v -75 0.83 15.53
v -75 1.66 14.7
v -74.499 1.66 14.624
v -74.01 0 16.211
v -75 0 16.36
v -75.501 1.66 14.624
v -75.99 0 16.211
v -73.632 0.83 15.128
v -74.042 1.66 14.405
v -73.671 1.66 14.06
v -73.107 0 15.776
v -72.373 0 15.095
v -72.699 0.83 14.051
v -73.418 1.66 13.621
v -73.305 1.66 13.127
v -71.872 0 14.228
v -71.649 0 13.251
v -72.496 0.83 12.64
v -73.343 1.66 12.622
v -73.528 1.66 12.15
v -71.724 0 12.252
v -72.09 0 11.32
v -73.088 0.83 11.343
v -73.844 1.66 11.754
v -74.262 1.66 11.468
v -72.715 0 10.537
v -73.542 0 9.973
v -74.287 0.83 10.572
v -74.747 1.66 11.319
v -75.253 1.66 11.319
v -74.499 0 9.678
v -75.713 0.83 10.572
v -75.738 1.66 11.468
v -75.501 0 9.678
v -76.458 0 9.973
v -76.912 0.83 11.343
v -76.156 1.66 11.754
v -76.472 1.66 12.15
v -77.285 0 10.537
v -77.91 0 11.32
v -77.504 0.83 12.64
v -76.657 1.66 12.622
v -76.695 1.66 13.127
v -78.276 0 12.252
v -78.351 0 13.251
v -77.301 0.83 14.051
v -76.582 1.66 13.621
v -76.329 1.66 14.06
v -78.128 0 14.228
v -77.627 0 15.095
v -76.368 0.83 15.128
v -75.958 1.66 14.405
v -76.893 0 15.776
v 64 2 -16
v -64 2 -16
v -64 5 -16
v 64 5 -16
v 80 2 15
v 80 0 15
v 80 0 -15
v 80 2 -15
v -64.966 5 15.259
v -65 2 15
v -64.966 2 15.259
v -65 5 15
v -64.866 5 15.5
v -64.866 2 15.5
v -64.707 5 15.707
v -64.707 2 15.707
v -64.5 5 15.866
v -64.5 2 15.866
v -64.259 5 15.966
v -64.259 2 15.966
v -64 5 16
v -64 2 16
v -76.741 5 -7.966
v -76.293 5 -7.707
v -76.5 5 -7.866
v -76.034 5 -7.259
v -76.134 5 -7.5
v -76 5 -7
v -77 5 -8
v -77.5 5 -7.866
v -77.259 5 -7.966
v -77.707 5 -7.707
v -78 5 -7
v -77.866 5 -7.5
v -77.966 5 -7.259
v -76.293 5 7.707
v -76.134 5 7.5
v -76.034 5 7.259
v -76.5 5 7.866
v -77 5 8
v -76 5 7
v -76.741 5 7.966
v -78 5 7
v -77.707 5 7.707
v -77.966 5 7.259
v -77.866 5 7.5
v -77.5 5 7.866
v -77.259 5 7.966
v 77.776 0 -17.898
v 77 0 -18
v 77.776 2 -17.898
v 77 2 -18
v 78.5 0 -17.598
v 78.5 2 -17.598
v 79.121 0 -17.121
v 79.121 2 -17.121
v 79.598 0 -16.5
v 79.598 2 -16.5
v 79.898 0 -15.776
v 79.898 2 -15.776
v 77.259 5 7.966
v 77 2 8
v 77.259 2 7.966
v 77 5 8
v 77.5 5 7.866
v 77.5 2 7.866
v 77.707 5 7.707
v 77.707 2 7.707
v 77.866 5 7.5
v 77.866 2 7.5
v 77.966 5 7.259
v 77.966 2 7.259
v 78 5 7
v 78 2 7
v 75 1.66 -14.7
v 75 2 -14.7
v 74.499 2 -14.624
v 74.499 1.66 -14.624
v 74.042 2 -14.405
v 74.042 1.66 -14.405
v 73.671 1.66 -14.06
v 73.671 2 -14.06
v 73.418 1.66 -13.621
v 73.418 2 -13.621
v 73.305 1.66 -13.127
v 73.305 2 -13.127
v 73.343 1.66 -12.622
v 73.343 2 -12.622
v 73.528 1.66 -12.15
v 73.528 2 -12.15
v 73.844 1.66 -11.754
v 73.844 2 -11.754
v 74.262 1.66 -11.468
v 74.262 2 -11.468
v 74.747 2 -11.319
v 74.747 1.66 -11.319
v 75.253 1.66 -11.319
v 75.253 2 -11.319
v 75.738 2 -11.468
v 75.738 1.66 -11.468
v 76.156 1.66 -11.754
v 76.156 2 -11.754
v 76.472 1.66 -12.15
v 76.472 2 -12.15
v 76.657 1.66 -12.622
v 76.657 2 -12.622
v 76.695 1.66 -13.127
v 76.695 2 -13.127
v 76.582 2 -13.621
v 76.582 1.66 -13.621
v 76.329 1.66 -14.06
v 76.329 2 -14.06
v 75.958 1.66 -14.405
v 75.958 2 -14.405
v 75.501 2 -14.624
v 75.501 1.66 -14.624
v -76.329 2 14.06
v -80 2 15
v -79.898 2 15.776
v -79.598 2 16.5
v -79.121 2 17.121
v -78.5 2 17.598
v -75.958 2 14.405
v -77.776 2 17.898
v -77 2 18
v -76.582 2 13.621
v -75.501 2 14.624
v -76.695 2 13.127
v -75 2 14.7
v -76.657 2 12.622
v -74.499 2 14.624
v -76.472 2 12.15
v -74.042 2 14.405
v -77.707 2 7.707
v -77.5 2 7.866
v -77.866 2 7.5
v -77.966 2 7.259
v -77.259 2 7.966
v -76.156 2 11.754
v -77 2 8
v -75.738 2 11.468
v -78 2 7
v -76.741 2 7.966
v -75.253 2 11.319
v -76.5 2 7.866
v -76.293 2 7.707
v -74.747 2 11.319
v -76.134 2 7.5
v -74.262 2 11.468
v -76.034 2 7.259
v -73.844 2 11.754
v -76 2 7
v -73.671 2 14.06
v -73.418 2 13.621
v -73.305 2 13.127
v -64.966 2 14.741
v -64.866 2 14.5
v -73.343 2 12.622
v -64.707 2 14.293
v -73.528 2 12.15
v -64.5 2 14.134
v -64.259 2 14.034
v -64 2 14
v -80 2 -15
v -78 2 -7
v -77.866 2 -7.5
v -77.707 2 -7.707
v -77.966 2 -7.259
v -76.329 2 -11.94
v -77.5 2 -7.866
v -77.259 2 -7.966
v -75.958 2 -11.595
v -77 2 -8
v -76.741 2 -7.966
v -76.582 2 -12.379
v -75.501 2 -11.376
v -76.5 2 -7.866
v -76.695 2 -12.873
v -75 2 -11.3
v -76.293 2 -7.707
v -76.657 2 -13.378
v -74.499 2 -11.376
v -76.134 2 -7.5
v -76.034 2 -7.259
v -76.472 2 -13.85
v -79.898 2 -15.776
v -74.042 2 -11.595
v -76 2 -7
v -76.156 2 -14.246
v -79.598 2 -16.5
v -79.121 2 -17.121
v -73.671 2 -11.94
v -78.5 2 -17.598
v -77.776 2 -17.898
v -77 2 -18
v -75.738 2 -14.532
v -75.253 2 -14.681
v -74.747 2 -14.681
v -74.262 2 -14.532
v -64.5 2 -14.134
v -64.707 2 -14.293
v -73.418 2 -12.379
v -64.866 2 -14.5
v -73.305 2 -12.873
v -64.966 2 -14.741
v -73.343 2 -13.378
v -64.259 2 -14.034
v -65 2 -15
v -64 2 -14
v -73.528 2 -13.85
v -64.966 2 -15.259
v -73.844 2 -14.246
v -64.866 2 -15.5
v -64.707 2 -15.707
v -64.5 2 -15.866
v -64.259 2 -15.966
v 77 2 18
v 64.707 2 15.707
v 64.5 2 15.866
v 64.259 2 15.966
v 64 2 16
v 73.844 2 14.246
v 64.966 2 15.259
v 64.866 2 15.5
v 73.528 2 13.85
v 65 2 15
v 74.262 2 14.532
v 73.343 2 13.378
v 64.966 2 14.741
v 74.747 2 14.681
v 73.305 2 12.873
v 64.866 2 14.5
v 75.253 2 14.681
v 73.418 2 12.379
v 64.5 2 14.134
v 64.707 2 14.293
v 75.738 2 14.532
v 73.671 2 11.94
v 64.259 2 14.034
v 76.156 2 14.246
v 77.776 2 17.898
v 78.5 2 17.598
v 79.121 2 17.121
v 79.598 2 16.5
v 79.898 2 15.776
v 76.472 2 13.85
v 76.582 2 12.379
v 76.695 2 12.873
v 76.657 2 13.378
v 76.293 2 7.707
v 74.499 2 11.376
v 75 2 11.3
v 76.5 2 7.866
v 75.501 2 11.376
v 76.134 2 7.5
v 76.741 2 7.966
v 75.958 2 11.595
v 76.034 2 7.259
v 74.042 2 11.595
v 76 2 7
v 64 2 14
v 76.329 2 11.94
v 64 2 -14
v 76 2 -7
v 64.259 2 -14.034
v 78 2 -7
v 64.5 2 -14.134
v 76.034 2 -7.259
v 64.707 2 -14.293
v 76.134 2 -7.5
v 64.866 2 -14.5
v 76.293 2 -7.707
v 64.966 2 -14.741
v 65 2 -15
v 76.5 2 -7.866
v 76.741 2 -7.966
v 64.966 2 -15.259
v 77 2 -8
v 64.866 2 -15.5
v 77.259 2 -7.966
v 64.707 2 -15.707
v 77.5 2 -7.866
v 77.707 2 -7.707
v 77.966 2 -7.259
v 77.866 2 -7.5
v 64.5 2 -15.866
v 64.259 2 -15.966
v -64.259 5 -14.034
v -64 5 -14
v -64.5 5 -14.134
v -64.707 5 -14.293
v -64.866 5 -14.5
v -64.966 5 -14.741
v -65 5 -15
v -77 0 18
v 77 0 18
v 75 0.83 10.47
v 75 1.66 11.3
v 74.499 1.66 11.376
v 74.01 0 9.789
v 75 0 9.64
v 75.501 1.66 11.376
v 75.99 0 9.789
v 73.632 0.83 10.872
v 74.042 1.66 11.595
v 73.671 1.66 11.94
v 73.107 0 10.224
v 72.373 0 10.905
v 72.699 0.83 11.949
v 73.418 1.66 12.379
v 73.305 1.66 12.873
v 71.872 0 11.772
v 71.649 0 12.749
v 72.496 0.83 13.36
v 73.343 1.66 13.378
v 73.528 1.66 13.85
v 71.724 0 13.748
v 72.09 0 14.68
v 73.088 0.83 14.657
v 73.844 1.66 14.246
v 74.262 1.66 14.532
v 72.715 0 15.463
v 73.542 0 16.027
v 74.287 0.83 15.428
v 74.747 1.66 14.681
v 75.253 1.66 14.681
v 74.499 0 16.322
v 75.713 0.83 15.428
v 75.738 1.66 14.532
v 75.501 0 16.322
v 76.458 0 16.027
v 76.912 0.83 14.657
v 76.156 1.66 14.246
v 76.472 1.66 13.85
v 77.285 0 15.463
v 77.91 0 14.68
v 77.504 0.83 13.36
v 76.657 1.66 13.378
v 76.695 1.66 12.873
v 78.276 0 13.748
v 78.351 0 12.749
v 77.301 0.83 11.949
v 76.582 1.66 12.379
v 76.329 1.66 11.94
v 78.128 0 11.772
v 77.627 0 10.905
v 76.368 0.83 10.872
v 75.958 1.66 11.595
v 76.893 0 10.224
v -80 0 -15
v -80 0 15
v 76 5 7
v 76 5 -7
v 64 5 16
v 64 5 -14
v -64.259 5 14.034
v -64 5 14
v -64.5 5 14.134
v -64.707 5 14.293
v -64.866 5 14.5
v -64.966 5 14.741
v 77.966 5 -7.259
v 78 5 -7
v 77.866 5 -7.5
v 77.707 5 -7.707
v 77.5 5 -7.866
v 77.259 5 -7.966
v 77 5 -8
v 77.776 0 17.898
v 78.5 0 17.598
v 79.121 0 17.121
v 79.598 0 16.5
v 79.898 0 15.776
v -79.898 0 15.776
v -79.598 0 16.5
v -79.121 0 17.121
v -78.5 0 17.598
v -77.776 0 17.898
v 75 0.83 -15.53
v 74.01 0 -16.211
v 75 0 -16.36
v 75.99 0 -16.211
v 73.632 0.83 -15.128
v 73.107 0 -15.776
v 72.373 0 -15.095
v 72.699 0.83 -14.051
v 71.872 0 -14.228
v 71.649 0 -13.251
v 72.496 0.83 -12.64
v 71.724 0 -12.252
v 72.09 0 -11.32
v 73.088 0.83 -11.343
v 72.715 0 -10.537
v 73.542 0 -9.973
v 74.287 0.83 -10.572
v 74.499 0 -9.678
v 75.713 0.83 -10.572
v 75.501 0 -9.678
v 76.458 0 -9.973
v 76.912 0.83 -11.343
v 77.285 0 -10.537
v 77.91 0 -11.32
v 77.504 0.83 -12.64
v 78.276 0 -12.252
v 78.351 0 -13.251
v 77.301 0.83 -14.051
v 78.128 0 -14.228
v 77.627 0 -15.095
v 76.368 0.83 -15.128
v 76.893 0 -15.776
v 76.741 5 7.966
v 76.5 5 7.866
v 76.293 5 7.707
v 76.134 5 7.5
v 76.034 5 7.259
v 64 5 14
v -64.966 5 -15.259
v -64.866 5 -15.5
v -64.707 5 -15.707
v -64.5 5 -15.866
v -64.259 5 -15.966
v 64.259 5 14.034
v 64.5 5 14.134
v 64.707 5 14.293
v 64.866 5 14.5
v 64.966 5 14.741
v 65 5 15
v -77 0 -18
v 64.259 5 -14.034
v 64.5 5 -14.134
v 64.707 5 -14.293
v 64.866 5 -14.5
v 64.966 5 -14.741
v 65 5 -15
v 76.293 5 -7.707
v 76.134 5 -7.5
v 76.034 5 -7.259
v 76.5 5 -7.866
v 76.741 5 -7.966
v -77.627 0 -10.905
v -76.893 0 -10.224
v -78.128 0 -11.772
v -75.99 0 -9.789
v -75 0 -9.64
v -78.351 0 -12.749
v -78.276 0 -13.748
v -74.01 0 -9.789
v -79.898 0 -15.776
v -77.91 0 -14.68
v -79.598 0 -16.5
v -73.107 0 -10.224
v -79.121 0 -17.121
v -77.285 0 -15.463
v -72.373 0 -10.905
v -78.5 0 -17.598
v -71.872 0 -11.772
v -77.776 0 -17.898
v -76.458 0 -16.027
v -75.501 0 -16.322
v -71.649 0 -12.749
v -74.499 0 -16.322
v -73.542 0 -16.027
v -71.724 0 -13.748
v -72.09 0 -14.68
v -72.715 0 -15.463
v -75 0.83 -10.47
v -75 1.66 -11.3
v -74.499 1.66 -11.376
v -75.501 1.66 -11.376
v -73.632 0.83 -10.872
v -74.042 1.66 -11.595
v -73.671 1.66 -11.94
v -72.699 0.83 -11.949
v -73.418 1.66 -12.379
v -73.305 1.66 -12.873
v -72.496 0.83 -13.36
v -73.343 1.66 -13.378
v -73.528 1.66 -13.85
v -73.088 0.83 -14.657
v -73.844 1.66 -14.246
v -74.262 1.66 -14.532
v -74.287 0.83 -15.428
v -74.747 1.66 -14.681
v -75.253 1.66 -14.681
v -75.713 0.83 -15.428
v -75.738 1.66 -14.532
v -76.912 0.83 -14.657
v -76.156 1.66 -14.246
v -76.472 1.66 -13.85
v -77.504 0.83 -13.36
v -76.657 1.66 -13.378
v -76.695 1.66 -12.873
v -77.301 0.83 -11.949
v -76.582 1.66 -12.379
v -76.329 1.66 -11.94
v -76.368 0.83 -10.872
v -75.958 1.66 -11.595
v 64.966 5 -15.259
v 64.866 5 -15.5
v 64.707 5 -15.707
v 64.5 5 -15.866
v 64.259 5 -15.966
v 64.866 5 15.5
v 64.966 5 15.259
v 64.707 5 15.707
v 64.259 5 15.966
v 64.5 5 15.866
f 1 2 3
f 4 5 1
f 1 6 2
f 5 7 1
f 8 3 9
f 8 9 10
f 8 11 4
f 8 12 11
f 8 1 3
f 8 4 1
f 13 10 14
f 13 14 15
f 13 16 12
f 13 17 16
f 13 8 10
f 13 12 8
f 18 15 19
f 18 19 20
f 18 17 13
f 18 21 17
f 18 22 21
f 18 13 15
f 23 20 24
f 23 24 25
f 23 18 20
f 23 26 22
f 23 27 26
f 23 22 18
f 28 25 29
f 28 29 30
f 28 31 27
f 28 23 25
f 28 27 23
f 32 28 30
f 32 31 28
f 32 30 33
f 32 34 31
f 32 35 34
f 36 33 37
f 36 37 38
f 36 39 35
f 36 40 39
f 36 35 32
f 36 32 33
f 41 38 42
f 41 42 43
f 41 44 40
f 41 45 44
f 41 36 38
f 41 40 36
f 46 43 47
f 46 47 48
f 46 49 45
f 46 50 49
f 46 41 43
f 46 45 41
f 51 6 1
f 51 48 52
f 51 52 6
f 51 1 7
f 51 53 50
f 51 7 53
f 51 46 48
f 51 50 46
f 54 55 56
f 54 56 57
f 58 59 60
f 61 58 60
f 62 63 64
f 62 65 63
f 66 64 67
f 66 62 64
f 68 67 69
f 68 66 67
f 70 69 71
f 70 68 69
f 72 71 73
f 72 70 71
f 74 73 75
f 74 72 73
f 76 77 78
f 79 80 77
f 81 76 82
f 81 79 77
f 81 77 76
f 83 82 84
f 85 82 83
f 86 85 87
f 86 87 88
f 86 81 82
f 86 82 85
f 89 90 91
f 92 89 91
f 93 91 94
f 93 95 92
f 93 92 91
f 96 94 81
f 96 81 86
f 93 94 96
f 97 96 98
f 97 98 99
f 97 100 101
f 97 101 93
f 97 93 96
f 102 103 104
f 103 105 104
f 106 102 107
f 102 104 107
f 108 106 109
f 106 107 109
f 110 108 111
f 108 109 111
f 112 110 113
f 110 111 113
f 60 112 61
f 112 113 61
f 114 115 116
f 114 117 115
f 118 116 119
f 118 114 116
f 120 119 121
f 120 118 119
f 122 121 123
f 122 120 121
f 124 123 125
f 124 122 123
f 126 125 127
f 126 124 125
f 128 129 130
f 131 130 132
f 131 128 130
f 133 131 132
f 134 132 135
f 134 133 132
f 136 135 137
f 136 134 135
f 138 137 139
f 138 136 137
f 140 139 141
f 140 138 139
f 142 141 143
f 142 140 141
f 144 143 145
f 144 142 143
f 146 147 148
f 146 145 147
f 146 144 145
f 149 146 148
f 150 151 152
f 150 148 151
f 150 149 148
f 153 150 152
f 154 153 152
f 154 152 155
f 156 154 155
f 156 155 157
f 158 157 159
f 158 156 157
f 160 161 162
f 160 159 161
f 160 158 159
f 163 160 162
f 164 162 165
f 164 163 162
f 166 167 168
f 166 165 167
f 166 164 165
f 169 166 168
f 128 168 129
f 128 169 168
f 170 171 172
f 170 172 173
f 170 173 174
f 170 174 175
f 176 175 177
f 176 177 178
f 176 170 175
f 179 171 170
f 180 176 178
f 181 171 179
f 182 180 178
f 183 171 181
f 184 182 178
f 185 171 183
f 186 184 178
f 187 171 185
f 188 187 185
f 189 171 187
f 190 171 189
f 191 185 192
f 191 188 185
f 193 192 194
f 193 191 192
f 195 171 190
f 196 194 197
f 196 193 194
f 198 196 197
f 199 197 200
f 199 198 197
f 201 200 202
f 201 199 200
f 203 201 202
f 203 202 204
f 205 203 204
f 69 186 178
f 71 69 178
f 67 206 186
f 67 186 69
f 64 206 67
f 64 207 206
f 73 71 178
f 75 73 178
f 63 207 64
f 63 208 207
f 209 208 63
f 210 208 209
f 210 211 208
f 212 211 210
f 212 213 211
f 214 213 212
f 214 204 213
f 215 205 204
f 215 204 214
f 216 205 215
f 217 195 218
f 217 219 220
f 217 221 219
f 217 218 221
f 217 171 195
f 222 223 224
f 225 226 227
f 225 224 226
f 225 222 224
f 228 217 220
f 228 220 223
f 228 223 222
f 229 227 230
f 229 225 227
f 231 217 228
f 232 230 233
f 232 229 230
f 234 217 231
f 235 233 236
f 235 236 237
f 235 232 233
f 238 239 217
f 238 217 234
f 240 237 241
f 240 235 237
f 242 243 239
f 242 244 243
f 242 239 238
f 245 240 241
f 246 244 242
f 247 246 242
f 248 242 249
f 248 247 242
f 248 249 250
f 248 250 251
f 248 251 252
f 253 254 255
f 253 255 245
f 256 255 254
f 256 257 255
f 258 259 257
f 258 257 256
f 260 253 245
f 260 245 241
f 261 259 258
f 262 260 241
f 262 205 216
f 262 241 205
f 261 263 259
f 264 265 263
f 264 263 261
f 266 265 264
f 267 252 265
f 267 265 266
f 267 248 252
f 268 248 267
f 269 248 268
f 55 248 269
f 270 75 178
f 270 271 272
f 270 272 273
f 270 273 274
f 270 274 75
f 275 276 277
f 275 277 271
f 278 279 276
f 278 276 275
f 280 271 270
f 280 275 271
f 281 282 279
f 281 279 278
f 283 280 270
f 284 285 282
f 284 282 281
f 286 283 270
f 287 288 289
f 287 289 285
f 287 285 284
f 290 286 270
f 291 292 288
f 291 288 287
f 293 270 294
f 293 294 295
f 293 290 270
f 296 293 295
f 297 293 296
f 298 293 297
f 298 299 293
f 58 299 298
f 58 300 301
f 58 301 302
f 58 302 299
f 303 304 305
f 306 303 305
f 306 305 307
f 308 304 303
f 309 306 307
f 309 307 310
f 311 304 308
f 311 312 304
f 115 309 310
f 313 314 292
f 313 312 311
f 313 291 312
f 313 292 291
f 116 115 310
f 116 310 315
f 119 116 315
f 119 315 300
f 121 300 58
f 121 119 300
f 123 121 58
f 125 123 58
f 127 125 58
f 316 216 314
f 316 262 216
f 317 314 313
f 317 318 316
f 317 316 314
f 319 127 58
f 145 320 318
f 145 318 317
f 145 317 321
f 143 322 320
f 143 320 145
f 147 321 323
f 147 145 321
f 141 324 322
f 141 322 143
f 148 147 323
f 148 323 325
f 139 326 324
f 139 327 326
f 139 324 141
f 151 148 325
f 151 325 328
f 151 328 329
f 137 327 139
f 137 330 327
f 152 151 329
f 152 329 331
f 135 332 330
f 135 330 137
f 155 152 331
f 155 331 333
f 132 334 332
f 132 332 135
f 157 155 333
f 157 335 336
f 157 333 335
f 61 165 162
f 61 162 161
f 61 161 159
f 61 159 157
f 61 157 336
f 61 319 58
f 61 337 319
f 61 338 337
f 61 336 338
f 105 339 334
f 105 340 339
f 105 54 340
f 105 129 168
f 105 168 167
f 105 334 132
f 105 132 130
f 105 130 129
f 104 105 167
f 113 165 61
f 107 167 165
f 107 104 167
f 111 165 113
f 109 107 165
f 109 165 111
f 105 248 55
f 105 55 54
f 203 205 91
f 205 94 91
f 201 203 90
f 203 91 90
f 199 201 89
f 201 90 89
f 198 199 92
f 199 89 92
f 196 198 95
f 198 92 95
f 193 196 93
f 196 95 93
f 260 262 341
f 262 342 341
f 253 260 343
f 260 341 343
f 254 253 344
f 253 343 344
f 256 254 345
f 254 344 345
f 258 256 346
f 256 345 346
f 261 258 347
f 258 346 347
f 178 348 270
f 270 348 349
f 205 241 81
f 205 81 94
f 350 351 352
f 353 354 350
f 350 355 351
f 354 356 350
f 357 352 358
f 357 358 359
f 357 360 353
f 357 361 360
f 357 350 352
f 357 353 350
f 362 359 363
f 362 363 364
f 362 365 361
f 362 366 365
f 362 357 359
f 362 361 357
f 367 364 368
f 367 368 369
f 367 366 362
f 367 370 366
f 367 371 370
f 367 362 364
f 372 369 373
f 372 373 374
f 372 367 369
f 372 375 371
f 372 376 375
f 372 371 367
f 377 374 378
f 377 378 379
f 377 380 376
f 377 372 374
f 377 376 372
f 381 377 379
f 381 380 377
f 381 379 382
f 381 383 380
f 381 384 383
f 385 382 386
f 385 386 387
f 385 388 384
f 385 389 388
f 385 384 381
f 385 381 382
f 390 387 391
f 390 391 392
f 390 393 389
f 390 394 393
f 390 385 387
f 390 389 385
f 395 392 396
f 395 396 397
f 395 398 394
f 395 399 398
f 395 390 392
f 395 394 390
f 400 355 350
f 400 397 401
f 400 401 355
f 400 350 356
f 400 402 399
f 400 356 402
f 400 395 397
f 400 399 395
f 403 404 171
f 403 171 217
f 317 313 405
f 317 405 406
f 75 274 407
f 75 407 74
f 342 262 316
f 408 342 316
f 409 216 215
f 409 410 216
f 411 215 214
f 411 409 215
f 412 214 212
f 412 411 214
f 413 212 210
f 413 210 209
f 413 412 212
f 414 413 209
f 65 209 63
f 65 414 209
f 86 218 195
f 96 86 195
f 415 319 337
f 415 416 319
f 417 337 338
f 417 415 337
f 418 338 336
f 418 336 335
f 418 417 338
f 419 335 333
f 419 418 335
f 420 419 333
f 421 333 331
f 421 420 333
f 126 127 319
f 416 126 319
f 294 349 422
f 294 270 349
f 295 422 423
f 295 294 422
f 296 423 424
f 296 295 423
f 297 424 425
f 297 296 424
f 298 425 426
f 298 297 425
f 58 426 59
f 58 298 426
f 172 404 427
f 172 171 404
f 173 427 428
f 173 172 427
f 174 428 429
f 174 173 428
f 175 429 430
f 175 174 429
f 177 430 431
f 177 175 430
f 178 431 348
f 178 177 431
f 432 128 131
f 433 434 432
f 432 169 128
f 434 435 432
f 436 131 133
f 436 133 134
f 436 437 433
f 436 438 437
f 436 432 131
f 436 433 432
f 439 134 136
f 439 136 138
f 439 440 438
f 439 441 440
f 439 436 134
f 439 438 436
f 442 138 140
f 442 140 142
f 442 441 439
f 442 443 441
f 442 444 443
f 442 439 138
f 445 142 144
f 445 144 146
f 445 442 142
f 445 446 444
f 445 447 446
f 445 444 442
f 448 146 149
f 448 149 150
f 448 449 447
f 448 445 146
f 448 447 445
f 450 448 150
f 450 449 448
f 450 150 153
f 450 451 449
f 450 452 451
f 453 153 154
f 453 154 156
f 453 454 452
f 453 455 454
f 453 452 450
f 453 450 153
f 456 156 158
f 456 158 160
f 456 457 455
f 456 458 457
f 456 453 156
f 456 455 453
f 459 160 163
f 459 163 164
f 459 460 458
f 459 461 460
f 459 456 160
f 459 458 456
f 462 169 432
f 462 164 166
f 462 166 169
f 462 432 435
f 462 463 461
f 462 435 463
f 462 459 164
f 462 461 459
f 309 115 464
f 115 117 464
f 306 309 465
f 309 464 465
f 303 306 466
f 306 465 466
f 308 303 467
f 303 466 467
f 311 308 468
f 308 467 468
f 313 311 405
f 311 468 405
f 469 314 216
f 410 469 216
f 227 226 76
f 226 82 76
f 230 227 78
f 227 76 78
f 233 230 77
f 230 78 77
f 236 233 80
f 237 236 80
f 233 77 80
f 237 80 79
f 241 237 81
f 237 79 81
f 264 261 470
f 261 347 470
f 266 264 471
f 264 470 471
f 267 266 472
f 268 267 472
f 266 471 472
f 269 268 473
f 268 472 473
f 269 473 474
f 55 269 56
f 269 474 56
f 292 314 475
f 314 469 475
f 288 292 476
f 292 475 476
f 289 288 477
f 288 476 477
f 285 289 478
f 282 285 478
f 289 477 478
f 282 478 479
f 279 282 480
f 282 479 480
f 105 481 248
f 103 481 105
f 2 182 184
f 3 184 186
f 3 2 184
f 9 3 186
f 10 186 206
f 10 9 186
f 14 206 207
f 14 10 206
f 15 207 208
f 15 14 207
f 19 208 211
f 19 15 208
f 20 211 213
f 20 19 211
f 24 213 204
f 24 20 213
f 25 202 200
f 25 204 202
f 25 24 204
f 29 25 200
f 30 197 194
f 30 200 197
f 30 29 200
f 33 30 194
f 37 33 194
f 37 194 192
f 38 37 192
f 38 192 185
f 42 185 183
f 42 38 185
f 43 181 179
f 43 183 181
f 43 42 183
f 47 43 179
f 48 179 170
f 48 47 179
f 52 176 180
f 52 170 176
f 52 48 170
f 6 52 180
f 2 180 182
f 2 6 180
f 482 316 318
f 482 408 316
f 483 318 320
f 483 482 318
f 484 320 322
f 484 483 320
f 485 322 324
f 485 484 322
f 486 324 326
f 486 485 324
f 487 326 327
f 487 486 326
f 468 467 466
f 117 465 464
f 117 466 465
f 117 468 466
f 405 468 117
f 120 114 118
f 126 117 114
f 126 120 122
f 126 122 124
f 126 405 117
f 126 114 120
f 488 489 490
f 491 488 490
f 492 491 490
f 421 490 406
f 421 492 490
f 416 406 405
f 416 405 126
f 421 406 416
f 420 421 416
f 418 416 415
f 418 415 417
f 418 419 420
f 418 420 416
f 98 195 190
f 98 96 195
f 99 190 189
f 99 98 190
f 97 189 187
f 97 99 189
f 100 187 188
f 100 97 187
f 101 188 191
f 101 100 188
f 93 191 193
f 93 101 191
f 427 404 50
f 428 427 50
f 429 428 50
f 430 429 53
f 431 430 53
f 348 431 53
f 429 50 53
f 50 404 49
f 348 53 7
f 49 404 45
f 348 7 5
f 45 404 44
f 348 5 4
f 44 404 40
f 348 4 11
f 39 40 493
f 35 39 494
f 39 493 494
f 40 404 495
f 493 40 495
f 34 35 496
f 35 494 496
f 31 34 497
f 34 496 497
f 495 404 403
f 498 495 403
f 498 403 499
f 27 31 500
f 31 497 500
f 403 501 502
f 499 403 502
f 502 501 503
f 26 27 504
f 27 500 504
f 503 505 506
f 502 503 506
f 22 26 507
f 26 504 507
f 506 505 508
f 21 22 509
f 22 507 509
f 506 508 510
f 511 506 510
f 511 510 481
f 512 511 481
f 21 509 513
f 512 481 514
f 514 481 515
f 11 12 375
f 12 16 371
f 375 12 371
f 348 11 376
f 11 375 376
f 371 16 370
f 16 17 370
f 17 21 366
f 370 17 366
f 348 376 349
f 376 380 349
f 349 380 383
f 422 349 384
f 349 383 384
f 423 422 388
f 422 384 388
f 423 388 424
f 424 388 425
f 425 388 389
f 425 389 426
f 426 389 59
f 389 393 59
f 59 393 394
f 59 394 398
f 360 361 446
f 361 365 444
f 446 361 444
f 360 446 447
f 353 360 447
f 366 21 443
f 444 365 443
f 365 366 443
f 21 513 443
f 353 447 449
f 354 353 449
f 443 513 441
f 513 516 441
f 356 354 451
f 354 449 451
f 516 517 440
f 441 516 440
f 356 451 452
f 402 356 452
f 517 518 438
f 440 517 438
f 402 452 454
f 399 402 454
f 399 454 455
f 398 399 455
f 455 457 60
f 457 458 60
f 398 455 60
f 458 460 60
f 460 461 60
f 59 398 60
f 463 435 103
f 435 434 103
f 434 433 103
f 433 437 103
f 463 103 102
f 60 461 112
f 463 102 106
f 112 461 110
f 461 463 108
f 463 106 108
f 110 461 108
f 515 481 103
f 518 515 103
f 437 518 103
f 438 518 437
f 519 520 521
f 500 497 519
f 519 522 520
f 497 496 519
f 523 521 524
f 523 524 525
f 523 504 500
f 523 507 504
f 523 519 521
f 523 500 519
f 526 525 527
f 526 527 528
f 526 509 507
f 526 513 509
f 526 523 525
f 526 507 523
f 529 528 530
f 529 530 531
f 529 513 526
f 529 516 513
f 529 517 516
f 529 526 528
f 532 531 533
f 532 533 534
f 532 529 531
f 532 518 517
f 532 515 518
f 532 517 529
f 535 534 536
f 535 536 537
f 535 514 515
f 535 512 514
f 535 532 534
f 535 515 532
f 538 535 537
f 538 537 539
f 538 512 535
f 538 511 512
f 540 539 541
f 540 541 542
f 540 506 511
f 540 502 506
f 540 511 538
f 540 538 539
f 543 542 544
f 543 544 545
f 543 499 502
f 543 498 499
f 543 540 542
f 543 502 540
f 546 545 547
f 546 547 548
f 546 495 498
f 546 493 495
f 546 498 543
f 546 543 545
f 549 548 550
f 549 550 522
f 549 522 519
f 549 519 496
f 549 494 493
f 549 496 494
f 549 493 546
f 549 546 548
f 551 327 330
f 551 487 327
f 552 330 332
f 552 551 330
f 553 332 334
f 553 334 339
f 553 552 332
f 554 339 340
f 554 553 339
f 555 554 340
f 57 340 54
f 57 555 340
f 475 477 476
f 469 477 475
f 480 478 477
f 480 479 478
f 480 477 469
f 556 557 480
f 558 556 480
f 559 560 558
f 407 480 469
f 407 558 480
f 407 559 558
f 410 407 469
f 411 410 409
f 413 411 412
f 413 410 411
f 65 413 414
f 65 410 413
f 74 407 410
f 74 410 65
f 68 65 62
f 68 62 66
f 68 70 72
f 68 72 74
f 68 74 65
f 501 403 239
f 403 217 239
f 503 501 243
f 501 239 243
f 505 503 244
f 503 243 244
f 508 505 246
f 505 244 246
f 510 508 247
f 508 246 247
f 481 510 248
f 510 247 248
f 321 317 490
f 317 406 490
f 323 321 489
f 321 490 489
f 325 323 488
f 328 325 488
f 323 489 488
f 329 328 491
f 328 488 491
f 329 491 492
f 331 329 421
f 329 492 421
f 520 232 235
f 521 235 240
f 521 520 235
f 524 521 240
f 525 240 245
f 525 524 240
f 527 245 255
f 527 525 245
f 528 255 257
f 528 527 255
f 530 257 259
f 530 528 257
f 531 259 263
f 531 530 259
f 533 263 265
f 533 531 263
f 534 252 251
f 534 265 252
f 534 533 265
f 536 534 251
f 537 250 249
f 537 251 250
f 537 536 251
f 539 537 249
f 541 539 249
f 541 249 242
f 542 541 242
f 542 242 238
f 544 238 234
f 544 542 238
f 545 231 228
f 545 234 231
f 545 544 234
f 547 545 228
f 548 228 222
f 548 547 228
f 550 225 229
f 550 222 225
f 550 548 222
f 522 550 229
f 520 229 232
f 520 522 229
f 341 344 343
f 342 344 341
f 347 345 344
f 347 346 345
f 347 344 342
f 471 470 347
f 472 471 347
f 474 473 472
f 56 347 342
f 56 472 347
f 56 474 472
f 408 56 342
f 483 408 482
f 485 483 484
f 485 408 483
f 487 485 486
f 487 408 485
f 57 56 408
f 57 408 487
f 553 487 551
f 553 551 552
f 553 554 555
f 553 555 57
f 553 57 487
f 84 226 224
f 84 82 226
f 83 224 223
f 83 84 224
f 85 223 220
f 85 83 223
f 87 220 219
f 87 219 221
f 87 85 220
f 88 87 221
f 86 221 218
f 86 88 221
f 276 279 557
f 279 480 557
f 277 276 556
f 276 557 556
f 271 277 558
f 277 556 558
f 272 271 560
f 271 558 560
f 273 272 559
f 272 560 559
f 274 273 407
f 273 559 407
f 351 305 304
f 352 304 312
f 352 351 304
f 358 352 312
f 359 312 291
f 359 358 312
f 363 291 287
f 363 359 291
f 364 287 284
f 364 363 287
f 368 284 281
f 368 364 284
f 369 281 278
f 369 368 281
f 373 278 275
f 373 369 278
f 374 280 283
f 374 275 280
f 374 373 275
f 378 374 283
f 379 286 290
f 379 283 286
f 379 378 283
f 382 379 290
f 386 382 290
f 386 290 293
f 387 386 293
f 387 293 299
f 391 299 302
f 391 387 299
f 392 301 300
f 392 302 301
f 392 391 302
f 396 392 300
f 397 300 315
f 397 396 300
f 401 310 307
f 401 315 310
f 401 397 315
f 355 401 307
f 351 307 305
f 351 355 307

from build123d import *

# Parameters (mm, degrees)
SKETCH1_W                    = 160
SKETCH1_H                    = 36
BOSS_EXTRUDE1_DEPTH          = 2
SKETCH2_W                    = 130
SKETCH2_H                    = 2
SKETCH2_W_2                  = 2
SKETCH2_H_2                  = 16
BOSS_EXTRUDE2_DEPTH          = 3
CSK_FOR_M3_SFHCS1_AT_2_COUNT = 2
CSK_FOR_M3_SFHCS1_AT_2_PITCH = 26
CIRPATTERN1_COUNT            = 2
FILLET1_R                    = 3
FILLET2_R                    = 1


with BuildPart() as part:
    # Sketch1 → Boss-Extrude1 (new body)
    with BuildSketch(Plane(origin=(0, 0, 0), x_dir=(1, 0, 0), z_dir=(0, 1, 0))):
        Rectangle(SKETCH1_W, SKETCH1_H)
    extrude(amount=BOSS_EXTRUDE1_DEPTH)

    # Sketch2 → Boss-Extrude2 (add)
    with BuildSketch(Plane(origin=(0, 2, 0), x_dir=(1, 0, 0), z_dir=(0, 1, 0))):
        with Locations((0, 15)):
            Rectangle(SKETCH2_W, SKETCH2_H)
        with Locations((77, 0)):
            Rectangle(SKETCH2_W_2, SKETCH2_H_2)
    boss_extrude2 = extrude(amount=BOSS_EXTRUDE2_DEPTH)

    # Sketch7 → CSK for M3 SFHCS1 (revolve, cut)
    with BuildSketch(Plane(origin=(75, 0, -13), x_dir=(0, 0, -1), z_dir=(1, 0, 0))):
        Polygon((0, 0), (0, 11.021463052), (1.7, 10), (1.7, 1.66), (3.36, 0), align=None)
    csk_for_m3_sfhcs1 = revolve(axis=Axis((75, -6.35, -13), (0, 1, 0)), mode=Mode.SUBTRACT)

    # CSK for M3 SFHCS1 at 2: CSK for M3 SFHCS1 ×2
    with Locations(*[(0, 0, i * CSK_FOR_M3_SFHCS1_AT_2_PITCH) for i in range(1, CSK_FOR_M3_SFHCS1_AT_2_COUNT)]):
        add(csk_for_m3_sfhcs1, mode=Mode.SUBTRACT)

    # CirPattern1: Boss-Extrude2, CSK for M3 SFHCS1 ×2 about axis
    cirpattern1_axis = Axis((0, 0, 0), (0, 1, 0))
    add([boss_extrude2.rotate(cirpattern1_axis, i * 360 / CIRPATTERN1_COUNT) for i in range(1, CIRPATTERN1_COUNT)])
    add([csk_for_m3_sfhcs1.rotate(cirpattern1_axis, i * 360 / CIRPATTERN1_COUNT) for i in range(1, CIRPATTERN1_COUNT)], mode=Mode.SUBTRACT)

    # CirPattern1 copy 1 sketch → CirPattern1 copy 1 (revolve, cut)
    with BuildSketch(Plane(origin=(-75, 0, -13), x_dir=(0, 0, 1), z_dir=(-1, 0, 0))):
        Polygon((0, 0), (0, 11.021463052), (1.7, 10), (1.7, 1.66), (3.36, 0), align=None)
    revolve(axis=Axis((-75, -6.35, -13), (0, 1, 0)), mode=Mode.SUBTRACT)

    # Fillet1
    fillet1_edges = [part.edges().sort_by_distance(p)[0] for p in [
        (-80, 1, -18),
        (80, 1, -18),
        (80, 1, 18),
        (-80, 1, 18),
    ]]
    fillet(fillet1_edges, radius=FILLET1_R)

    # Fillet2
    fillet2_edges = [part.edges().sort_by_distance(p)[0] for p in [
        (-78, 3.5, -8),
        (-78, 3.5, 8),
        (-76, 3.5, 8),
        (-76, 3.5, -8),
        (-65, 3.5, 14),
        (-65, 3.5, 16),
        (65, 3.5, 16),
        (65, 3.5, 14),
        (78, 3.5, 8),
        (78, 3.5, -8),
        (76, 3.5, -8),
        (76, 3.5, 8),
        (65, 3.5, -14),
        (65, 3.5, -16),
        (-65, 3.5, -16),
        (-65, 3.5, -14),
    ]]
    fillet(fillet2_edges, radius=FILLET2_R - 0.0001)  # a hair under: the kernel refuses the full size


solid = part.part
